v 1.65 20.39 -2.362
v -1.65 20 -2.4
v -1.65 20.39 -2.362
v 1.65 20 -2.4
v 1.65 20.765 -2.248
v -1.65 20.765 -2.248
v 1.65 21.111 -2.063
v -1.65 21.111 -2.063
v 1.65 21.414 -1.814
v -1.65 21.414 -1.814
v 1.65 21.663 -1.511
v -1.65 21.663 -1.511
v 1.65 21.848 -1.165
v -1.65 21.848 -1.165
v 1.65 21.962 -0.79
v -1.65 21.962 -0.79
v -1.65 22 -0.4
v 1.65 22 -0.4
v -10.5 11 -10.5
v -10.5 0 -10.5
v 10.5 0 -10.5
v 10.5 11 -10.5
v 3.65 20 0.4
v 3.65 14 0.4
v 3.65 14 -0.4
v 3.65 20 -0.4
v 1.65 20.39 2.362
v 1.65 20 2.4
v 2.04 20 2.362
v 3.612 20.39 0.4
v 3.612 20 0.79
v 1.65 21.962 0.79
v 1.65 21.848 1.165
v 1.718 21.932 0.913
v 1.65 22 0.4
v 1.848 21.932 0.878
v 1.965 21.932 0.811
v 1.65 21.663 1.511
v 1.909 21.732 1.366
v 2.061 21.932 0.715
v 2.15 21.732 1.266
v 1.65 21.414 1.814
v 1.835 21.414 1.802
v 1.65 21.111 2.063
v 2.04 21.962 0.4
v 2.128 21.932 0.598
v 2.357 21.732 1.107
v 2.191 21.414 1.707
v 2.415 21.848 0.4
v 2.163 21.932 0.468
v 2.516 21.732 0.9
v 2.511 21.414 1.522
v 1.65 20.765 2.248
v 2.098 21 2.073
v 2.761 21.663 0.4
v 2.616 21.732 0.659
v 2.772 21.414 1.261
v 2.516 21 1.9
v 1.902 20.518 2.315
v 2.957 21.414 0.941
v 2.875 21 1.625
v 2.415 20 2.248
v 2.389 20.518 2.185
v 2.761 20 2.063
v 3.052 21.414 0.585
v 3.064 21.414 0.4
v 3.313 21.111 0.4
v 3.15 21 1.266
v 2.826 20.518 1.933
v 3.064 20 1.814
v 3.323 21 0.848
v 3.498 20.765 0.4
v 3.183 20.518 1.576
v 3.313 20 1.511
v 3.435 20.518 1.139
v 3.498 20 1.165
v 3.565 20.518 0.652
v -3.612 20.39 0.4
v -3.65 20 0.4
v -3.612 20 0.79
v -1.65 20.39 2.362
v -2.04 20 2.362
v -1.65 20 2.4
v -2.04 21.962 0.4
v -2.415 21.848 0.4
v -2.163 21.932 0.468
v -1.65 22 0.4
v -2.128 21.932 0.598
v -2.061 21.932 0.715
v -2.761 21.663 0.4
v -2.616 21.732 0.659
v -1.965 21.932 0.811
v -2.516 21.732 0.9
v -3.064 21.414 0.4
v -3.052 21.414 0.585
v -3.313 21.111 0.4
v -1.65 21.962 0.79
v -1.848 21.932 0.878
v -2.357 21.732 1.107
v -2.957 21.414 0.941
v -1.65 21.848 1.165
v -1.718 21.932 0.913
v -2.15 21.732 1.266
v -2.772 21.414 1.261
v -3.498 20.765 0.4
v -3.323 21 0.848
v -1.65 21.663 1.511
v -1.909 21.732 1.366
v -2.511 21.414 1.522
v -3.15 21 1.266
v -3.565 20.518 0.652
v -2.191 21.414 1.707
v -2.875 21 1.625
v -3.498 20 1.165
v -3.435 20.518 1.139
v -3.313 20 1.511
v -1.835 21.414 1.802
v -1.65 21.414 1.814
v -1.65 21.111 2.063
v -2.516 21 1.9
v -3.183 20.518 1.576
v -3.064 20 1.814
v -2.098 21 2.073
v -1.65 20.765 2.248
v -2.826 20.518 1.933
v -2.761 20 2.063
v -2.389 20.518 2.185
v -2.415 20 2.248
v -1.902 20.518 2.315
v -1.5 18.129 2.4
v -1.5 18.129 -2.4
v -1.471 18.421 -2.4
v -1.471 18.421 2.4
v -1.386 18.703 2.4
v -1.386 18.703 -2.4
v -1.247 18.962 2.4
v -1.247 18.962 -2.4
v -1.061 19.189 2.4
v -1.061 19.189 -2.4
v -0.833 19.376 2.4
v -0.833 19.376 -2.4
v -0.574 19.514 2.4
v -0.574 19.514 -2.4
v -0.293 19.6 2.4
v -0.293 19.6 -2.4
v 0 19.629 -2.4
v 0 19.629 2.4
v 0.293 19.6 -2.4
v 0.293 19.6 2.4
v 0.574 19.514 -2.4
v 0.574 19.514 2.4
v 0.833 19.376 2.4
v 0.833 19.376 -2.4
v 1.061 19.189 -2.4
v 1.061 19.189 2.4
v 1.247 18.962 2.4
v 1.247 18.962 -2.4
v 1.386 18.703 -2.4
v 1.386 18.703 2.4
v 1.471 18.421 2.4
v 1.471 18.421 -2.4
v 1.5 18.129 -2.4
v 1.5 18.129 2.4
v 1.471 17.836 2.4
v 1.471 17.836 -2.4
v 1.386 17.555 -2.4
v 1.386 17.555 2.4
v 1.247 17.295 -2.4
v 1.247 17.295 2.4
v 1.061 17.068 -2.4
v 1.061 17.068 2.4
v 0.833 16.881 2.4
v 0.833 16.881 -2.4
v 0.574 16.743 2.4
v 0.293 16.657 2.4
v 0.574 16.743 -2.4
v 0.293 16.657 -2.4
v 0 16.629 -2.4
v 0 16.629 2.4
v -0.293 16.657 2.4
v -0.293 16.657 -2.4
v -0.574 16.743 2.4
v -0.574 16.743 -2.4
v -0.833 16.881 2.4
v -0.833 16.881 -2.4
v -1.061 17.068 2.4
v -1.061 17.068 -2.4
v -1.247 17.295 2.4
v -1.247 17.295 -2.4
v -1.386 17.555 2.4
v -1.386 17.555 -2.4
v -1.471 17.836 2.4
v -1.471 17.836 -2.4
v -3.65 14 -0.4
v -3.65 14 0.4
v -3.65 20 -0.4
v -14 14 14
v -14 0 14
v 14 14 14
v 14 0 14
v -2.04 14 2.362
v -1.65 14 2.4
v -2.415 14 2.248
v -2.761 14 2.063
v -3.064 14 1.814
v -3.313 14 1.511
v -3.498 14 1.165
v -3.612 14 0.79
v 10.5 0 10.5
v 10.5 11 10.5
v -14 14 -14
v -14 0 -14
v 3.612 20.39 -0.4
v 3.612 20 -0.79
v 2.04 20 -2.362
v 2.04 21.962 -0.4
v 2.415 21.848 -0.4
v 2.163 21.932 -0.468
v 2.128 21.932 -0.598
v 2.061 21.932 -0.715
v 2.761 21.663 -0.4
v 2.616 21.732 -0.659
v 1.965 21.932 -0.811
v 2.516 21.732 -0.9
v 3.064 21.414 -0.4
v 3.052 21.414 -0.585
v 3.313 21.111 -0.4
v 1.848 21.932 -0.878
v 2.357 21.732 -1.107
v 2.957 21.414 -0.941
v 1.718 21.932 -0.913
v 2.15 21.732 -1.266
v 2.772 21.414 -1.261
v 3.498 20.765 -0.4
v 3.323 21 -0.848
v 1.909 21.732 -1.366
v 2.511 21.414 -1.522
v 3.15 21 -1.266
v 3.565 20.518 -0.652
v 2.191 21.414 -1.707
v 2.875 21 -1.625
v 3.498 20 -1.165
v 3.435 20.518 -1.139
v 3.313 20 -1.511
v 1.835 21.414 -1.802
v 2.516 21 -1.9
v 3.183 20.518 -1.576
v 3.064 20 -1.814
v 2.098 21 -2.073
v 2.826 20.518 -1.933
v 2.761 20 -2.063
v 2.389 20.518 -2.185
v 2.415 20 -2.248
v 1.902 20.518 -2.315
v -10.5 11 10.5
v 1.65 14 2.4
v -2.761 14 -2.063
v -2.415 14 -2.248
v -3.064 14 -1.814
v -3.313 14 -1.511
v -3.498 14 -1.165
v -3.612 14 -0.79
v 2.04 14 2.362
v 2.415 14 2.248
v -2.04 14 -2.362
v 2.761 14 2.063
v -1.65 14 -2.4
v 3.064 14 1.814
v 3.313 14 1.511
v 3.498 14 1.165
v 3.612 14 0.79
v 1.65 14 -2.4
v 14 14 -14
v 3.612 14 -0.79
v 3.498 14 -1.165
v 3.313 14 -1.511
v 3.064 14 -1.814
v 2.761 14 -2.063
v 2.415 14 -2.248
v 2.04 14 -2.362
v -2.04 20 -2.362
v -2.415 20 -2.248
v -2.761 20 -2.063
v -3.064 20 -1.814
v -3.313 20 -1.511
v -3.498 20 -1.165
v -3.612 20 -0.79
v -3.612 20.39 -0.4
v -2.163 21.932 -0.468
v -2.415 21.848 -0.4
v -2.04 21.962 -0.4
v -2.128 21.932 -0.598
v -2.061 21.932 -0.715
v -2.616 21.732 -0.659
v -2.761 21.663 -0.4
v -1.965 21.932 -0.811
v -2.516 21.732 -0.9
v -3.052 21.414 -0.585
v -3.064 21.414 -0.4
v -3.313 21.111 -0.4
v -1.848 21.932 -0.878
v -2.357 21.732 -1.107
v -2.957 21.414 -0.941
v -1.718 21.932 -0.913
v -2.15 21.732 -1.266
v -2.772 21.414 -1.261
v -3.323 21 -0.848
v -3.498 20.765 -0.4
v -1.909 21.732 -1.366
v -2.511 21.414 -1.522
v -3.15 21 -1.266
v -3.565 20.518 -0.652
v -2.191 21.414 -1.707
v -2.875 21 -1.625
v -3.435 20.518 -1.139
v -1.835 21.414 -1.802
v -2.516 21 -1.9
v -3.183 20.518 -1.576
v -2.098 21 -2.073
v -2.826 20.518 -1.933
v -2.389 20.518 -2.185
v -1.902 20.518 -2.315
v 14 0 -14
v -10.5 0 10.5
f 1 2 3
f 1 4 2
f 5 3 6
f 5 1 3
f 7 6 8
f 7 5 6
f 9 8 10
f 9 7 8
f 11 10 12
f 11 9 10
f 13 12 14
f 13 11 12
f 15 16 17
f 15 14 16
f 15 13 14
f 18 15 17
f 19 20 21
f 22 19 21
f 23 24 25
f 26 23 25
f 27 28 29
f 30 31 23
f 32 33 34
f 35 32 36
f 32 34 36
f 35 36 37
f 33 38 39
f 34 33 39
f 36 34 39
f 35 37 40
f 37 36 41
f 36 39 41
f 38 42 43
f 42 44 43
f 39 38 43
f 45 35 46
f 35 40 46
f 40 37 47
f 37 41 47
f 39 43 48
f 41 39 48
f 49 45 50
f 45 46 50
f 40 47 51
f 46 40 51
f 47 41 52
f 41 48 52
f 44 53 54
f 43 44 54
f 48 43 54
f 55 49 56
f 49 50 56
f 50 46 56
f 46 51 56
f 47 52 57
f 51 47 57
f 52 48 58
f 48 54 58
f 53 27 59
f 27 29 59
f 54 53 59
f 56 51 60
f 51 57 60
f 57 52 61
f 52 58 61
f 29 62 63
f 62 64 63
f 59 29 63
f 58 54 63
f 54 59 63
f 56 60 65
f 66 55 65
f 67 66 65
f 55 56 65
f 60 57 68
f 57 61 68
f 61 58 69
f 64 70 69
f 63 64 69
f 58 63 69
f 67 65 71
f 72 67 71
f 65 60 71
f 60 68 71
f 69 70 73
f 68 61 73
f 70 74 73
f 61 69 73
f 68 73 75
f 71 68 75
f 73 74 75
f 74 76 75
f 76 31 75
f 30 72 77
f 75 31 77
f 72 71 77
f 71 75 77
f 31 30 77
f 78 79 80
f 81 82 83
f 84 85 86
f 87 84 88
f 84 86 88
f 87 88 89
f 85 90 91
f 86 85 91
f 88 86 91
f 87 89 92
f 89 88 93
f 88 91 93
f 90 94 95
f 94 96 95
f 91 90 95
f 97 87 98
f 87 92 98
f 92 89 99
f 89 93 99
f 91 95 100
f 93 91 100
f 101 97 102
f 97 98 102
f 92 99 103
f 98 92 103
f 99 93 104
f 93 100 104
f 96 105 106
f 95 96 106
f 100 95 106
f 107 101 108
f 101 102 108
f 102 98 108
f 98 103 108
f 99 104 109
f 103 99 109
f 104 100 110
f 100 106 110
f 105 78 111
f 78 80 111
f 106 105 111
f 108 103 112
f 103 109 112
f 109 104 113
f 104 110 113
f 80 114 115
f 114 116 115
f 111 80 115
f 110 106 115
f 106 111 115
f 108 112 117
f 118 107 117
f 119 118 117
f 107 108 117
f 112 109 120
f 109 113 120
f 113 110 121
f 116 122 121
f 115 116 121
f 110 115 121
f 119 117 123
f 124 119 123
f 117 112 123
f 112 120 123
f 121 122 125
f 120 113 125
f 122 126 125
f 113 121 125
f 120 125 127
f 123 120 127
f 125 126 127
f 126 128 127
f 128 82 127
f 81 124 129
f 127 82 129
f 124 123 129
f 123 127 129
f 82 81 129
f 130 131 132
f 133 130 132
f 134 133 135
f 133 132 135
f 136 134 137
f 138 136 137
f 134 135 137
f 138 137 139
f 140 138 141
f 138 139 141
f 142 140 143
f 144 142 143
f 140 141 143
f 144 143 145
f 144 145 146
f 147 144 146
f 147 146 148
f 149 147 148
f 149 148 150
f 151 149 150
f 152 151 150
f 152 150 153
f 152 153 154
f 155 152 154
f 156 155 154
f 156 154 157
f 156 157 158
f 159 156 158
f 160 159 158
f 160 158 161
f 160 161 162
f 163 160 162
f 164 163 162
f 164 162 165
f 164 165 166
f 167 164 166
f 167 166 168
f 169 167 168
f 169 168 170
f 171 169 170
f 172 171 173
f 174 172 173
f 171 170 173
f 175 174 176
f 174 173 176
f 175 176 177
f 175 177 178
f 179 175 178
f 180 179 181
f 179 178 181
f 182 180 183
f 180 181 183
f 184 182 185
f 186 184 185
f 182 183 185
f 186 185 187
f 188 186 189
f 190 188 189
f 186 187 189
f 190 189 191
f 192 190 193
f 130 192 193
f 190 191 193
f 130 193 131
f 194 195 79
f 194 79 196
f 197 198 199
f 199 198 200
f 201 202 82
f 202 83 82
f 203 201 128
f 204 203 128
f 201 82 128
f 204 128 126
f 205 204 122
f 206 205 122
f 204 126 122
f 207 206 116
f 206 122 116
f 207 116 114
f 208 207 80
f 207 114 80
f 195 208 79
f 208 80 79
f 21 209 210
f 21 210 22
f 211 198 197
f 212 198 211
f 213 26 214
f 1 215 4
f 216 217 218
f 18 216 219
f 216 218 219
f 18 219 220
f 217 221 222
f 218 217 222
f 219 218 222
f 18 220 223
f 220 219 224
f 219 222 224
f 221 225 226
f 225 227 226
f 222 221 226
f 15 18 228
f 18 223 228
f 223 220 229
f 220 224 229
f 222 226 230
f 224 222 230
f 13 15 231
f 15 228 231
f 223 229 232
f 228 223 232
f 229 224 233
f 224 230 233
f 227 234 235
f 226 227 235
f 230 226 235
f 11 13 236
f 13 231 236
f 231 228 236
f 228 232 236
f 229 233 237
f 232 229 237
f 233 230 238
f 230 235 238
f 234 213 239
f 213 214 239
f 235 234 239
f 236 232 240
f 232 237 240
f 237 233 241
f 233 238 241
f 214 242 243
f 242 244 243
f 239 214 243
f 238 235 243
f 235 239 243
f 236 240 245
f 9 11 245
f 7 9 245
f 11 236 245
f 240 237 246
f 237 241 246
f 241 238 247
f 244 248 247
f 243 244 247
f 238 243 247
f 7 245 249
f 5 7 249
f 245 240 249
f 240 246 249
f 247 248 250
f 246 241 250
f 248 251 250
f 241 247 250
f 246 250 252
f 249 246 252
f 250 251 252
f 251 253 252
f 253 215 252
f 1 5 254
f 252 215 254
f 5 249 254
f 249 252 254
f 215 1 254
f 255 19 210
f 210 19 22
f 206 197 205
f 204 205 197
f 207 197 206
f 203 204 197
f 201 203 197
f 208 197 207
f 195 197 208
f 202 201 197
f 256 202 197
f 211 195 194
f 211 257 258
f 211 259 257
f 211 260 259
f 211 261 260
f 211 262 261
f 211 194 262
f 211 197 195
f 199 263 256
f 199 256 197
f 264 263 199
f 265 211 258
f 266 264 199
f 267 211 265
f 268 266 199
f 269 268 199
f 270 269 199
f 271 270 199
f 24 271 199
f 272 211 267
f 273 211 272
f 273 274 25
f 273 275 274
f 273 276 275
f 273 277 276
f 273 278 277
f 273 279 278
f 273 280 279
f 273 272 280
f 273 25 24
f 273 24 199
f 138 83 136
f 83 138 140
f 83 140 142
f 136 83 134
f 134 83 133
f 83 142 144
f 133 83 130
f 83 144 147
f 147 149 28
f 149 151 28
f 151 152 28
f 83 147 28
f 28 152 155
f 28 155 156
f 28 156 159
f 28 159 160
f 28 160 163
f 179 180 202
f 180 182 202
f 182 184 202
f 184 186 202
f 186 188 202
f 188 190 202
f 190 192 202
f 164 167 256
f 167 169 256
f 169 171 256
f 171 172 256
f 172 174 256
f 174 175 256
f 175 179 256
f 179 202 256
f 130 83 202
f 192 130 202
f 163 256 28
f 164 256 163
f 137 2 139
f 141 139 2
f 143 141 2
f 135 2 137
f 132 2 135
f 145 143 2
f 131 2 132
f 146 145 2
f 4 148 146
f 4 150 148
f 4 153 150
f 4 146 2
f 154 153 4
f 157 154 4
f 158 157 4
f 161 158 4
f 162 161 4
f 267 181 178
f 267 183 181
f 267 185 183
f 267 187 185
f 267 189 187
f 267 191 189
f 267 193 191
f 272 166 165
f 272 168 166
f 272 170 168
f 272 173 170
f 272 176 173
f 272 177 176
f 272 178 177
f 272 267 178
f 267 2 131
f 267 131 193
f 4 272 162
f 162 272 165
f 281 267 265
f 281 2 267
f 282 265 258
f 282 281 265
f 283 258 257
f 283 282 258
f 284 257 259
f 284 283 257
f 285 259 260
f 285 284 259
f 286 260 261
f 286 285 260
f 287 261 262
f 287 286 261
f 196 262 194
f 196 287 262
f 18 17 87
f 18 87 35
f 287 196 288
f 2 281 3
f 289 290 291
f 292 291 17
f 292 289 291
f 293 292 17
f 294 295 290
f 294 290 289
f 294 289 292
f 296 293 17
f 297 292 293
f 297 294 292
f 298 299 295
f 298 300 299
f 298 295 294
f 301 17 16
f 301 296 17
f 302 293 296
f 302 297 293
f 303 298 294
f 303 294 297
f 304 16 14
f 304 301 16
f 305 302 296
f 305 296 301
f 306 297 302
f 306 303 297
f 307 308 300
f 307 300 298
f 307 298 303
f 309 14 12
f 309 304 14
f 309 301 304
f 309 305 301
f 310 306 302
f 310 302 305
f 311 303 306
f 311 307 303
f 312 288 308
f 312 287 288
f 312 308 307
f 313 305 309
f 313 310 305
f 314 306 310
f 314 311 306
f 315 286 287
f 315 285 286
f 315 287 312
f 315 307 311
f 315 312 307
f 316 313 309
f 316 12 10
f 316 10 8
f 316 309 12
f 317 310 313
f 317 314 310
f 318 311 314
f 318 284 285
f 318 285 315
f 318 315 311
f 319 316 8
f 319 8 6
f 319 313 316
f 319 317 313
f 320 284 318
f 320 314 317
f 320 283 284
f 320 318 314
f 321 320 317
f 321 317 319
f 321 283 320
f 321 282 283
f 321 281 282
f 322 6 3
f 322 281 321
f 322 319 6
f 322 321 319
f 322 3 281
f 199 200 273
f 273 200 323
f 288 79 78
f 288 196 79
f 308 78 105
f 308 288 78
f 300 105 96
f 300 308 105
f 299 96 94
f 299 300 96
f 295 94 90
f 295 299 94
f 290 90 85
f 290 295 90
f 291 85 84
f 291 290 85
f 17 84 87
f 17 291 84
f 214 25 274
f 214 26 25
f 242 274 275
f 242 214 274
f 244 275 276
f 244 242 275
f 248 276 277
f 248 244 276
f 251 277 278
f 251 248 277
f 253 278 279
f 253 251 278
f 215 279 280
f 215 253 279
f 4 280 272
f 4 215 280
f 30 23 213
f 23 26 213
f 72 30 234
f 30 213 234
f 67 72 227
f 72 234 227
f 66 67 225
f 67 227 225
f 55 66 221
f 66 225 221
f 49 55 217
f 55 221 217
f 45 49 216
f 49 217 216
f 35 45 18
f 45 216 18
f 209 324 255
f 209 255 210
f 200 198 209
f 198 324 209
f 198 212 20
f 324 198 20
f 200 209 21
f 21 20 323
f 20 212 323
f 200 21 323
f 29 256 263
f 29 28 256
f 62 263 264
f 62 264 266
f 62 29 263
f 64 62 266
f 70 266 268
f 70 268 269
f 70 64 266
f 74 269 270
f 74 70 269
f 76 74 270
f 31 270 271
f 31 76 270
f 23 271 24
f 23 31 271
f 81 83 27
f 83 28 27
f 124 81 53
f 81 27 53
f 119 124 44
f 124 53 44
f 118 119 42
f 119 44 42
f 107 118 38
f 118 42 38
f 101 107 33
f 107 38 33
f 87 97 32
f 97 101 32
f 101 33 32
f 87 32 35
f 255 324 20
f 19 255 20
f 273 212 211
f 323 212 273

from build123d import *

# Parameters (mm, degrees)
SKETCH1_W           = 28
SKETCH1_H           = 28
SKETCH1_W_2         = 21
SKETCH1_H_2         = 21
BOSS_EXTRUDE1_DEPTH = 11
SKETCH2_W           = 28
SKETCH2_H           = 28
BOSS_EXTRUDE2_DEPTH = 3
SKETCH3_W           = 7.3
SKETCH3_H           = 4.8
BOSS_EXTRUDE3_DEPTH = 8
FILLET3_R           = 2
SKETCH4_R           = 1.5
CUT_EXTRUDE1_DEPTH  = 5


with BuildPart() as part:
    # Sketch1 → Boss-Extrude1 (new body)
    with BuildSketch(Plane(origin=(0, 0, 0), x_dir=(1, 0, 0), z_dir=(0, 1, 0))):
        Rectangle(SKETCH1_W, SKETCH1_H)
        Rectangle(SKETCH1_W_2, SKETCH1_H_2, mode=Mode.SUBTRACT)
    extrude(amount=BOSS_EXTRUDE1_DEPTH)

    # Sketch2 → Boss-Extrude2 (add)
    with BuildSketch(Plane(origin=(0, 11, 0), x_dir=(1, 0, 0), z_dir=(0, 1, 0))):
        Rectangle(SKETCH2_W, SKETCH2_H)
    extrude(amount=BOSS_EXTRUDE2_DEPTH)

    # Sketch3 → Boss-Extrude3 (add)
    with BuildSketch(Plane(origin=(0, 14, 0), x_dir=(1, 0, 0), z_dir=(0, 1, 0))):
        Rectangle(SKETCH3_W, SKETCH3_H)
    extrude(amount=BOSS_EXTRUDE3_DEPTH)

    # Fillet3
    fillet3_edges = [part.edges().sort_by_distance(p)[0] for p in [
        (-3.65, 18, -2.4),
        (-3.65, 18, 2.4),
        (3.65, 18, 2.4),
        (3.65, 18, -2.4),
        (-3.65, 22, 0),
        (0, 22, 2.4),
        (3.65, 22, 0),
        (0, 22, -2.4),
    ]]
    fillet(fillet3_edges, radius=FILLET3_R)

    # Sketch4 → Cut-Extrude1 (cut)
    with BuildSketch(Plane(origin=(0, 0, -2.4), x_dir=(-1, 0, 0), z_dir=(0, 0, -1))):
        with Locations((0, 18.128577291)):
            Circle(SKETCH4_R)
    extrude(amount=-CUT_EXTRUDE1_DEPTH, mode=Mode.SUBTRACT)


solid = part.part
